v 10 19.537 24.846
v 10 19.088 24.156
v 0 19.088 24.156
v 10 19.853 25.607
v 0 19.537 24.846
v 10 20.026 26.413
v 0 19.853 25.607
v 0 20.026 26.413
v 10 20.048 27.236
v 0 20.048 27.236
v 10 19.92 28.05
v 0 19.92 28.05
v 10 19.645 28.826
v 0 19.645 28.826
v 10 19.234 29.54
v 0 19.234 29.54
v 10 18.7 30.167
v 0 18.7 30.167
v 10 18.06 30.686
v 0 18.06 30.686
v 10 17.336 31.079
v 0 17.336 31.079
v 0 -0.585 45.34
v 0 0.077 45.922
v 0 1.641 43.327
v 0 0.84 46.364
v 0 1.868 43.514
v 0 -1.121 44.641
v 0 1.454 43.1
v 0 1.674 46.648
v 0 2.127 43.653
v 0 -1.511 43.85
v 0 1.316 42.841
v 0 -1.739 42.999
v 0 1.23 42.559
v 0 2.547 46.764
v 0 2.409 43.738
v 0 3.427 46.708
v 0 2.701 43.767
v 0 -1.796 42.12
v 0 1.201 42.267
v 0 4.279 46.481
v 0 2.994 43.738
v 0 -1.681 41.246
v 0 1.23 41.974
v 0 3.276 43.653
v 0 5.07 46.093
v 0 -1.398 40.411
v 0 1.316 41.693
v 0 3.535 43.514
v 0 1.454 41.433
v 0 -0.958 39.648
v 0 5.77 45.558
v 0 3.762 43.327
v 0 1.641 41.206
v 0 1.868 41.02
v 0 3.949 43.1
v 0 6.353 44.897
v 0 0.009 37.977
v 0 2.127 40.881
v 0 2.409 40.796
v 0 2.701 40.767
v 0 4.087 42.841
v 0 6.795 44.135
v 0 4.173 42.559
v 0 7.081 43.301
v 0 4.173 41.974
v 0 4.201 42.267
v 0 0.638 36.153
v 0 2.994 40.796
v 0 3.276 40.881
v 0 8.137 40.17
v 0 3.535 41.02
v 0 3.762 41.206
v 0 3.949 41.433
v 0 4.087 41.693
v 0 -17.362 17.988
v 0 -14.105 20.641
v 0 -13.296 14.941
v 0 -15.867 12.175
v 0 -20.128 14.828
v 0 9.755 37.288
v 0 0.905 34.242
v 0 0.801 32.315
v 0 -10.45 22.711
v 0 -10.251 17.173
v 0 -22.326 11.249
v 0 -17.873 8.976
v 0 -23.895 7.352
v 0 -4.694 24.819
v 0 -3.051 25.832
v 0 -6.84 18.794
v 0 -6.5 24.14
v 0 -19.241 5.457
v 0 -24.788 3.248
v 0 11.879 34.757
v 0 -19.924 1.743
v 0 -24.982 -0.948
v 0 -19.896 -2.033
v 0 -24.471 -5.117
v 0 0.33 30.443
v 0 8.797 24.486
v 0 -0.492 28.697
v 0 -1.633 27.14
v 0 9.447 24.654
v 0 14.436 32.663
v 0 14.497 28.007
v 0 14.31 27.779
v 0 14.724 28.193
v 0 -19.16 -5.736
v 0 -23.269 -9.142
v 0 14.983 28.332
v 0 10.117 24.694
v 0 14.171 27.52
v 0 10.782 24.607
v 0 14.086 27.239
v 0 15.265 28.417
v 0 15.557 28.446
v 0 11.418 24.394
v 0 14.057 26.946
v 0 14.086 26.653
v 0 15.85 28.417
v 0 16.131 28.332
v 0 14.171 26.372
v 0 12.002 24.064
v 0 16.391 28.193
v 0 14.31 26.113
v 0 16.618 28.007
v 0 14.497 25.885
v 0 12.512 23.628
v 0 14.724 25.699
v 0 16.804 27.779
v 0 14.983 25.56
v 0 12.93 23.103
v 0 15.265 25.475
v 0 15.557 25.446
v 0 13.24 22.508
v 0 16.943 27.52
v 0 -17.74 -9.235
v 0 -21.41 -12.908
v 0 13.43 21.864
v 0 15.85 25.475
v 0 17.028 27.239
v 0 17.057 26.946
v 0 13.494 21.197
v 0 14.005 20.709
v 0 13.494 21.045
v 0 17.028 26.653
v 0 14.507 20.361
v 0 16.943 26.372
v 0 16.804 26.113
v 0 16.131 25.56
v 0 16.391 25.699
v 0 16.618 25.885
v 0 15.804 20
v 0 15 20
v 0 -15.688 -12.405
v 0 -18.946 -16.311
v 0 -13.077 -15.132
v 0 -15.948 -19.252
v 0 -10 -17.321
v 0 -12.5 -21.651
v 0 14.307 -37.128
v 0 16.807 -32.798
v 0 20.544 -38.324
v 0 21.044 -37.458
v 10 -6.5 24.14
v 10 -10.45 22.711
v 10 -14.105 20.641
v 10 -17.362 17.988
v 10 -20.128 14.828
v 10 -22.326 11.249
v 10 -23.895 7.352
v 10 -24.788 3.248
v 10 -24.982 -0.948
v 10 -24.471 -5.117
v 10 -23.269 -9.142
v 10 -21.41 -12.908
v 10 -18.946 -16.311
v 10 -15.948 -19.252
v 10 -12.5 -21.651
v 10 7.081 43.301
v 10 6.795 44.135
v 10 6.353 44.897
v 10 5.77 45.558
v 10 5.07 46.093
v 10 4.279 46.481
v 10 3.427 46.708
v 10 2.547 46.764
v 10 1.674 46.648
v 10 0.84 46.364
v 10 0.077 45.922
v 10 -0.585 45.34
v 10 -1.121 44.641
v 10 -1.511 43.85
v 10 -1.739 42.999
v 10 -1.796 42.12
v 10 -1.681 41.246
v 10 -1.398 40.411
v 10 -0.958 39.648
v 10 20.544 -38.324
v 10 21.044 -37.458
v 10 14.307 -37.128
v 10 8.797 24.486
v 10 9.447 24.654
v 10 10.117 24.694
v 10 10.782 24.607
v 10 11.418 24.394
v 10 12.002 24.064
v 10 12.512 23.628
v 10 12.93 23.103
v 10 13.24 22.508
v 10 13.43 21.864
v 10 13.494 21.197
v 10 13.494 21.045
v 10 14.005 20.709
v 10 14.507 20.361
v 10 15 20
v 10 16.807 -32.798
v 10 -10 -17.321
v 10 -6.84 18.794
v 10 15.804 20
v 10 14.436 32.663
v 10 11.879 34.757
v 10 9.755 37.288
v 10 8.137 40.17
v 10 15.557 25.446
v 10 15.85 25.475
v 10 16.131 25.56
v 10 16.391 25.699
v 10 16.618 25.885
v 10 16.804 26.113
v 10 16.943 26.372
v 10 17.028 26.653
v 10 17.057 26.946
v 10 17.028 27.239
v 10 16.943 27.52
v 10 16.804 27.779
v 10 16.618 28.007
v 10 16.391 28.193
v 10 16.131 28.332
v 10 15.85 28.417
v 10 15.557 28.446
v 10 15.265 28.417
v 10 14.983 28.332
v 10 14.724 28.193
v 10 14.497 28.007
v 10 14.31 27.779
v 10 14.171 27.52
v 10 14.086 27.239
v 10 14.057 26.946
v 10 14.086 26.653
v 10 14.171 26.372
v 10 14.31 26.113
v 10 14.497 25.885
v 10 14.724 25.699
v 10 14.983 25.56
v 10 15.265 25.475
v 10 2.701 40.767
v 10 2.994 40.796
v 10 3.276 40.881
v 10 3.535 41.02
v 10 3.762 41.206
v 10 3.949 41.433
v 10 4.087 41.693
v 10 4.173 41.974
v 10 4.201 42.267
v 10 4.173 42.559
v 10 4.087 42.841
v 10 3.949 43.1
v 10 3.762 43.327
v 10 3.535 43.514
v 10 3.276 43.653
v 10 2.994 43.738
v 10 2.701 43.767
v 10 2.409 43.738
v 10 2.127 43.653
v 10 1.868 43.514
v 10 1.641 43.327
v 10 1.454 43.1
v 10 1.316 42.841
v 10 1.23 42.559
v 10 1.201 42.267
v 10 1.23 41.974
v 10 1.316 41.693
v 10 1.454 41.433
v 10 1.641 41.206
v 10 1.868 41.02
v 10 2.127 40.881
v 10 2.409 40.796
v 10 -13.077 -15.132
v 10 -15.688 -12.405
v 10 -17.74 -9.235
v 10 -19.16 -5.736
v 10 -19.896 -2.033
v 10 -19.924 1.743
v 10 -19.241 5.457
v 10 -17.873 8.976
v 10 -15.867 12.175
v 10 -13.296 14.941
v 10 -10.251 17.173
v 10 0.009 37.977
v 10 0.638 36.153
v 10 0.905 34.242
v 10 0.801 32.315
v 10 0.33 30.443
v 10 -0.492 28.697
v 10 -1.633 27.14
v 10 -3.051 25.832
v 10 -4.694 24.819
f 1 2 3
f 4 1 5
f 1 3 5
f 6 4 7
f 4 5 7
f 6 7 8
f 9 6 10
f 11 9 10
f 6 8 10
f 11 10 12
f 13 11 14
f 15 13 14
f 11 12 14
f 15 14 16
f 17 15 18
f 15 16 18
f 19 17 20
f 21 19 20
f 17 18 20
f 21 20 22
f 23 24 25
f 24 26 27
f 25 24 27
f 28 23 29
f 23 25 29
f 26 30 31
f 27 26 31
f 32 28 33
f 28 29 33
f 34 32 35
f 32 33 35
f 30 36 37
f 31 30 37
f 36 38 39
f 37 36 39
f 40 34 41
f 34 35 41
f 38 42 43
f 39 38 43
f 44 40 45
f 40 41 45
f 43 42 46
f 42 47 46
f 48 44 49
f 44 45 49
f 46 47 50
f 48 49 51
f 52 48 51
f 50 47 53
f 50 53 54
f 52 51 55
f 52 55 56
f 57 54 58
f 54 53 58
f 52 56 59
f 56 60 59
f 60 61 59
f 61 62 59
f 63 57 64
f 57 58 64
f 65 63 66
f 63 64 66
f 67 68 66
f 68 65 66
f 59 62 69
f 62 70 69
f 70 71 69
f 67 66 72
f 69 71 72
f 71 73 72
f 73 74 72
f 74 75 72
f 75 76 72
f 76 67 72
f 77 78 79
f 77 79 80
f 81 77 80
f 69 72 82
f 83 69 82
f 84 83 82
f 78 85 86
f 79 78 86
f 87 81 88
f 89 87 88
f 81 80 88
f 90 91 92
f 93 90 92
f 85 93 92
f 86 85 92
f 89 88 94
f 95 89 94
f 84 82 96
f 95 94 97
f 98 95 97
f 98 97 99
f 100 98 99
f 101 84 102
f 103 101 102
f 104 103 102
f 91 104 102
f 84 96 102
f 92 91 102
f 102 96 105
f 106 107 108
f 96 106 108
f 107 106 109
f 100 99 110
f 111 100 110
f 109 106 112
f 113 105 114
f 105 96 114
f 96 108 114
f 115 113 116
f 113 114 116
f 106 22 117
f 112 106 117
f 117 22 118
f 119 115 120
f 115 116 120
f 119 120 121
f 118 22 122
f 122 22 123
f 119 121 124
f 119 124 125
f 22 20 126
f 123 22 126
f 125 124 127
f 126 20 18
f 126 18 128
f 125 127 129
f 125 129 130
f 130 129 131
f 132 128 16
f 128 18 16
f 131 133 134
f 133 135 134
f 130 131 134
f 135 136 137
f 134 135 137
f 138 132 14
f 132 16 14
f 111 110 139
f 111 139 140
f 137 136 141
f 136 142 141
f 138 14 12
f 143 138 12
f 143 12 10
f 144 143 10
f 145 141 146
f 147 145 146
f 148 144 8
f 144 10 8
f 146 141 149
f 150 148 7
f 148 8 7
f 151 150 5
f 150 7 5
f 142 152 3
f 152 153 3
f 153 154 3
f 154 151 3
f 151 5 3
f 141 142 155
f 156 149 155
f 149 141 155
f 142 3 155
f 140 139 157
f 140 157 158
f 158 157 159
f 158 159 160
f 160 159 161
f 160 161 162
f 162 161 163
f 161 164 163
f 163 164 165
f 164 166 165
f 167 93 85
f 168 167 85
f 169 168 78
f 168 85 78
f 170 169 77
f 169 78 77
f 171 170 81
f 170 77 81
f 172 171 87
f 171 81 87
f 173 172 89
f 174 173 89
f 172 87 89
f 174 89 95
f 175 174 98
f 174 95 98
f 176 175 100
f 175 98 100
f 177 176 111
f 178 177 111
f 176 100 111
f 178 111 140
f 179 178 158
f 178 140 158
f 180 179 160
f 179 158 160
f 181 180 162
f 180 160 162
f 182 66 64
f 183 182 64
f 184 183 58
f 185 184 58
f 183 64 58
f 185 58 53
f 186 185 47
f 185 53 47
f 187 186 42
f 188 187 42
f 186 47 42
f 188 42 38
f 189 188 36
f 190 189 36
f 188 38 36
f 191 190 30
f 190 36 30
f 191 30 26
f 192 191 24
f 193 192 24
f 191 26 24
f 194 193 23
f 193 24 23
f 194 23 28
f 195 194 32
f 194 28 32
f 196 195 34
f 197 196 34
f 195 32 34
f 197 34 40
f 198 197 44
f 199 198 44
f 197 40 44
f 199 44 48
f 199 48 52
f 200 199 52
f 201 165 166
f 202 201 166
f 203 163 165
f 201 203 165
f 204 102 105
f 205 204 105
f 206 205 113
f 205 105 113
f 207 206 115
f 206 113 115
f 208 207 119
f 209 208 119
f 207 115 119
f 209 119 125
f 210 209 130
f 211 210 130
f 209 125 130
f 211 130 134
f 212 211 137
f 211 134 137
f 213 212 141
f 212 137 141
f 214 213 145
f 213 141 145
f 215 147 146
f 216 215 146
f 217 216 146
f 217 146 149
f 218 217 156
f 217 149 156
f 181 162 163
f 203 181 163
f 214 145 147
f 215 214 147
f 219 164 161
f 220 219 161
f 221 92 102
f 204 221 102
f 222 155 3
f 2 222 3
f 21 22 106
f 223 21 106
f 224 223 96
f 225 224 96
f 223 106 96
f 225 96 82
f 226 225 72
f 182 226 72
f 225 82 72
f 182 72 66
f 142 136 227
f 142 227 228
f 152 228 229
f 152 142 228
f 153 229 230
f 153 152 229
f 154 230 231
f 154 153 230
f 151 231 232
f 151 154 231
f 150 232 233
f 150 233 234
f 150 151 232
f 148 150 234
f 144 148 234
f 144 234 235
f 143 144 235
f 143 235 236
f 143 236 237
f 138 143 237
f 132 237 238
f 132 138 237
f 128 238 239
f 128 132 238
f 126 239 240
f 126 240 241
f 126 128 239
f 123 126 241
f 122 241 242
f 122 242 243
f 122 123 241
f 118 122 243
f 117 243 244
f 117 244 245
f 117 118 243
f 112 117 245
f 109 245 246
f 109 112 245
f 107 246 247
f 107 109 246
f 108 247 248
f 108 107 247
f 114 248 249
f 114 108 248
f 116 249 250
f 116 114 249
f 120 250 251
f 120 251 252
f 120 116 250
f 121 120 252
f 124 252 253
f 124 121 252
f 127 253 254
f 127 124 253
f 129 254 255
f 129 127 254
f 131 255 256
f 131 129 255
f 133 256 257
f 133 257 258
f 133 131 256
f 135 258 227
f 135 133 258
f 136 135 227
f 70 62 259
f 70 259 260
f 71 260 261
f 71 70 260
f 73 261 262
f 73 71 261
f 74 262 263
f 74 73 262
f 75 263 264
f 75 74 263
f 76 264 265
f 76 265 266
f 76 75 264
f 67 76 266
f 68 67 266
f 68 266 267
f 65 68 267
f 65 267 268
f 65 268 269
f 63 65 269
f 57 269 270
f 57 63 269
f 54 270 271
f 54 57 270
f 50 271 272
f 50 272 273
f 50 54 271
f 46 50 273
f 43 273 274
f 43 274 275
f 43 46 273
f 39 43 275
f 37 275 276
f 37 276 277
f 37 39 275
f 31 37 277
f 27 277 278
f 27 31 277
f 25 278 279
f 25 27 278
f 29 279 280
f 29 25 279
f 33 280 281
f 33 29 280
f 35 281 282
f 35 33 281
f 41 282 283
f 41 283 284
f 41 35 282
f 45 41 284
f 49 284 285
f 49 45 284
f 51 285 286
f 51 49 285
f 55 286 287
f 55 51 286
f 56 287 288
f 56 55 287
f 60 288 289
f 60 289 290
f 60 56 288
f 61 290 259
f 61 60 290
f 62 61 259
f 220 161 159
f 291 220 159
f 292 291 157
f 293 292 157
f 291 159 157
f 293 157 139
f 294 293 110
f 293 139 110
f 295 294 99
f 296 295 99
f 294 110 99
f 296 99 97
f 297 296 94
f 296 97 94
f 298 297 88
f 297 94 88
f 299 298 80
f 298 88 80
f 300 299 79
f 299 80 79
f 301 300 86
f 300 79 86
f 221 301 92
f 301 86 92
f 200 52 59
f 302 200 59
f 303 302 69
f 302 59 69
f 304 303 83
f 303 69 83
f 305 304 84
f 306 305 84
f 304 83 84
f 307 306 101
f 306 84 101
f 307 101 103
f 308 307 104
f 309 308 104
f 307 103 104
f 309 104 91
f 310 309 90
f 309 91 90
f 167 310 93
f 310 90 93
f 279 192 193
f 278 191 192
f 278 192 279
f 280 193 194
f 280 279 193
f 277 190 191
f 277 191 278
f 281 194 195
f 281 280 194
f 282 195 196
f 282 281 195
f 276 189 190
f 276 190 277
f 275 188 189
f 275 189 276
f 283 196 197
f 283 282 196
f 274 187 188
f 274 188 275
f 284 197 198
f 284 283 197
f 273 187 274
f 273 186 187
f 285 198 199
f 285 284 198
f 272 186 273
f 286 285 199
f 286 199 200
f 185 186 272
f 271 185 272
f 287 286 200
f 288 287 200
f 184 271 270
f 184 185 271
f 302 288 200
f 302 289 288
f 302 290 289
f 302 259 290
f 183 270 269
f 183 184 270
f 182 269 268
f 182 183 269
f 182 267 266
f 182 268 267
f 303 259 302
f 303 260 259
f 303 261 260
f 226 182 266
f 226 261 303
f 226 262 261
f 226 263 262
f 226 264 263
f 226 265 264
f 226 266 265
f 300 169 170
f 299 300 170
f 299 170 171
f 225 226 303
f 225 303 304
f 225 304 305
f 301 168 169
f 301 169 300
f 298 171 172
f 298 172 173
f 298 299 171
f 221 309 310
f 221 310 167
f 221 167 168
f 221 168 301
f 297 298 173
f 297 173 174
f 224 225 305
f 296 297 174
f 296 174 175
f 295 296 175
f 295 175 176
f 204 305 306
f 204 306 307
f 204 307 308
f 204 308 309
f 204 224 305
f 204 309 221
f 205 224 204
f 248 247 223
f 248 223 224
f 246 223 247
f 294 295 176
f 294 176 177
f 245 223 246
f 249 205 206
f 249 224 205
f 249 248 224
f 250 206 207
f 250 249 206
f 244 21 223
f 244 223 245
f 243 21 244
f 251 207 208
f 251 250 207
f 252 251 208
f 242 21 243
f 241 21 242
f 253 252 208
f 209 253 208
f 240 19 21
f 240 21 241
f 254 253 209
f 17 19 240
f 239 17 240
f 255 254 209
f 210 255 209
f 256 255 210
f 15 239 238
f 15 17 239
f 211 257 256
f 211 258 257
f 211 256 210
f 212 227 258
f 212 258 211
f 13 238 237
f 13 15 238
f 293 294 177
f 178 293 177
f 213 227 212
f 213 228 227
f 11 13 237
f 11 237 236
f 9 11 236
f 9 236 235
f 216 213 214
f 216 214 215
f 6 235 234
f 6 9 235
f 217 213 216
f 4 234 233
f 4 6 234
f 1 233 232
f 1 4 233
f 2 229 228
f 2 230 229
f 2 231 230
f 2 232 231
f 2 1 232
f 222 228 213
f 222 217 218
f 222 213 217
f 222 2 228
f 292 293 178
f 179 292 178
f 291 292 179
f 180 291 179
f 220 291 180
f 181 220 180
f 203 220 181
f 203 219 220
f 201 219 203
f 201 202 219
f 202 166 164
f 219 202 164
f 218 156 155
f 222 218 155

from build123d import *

# Parameters (mm, degrees)
SKETCH_1_R      = 1.5
EXTRUDE_2_DEPTH = 10


with BuildPart() as part:
    # 草图1 → 凸台-拉伸2 (new body)
    with BuildSketch(Plane(origin=(0, 0, 0), x_dir=(0, 0, -1), z_dir=(1, 0, 0))):
        with BuildLine():
            ThreePointArc((17.320508076, -10), (-1.743114855, -19.923893962), (-18.793852416, -6.840402867))
            Line((-18.793852416, -6.840402867), (-24.485520572, 8.797326871))
            ThreePointArc((-24.485520572, 8.797326871), (-24.06362866, 12.001914989), (-21.196596456, 13.494397531))
            Line((-21.196596456, 13.494397531), (-21.045218822, 13.494397531))
            ThreePointArc((-21.045218822, 13.494397531), (-20.53641173, 14.256780606), (-20, 15))
            Line((-20, 15), (-20, 15.803944373))
            Line((-20, 15.803944373), (-24.155954344, 19.087967936))
            ThreePointArc((-24.155954344, 19.087967936), (-28.049684886, 19.919774087), (-31.079320854, 17.336298731))
            ThreePointArc((-31.079320854, 17.336298731), (-35.972771838, 10.757774611), (-43.301092247, 7.081014883))
            ThreePointArc((-43.301092247, 7.081014883), (-46.36357592, 0.839616609), (-39.647678535, -0.957765092))
            ThreePointArc((-39.647678535, -0.957765092), (-30.443187857, 0.329762523), (-24.14010081, -6.500425592))
            ThreePointArc((-24.14010081, -6.500425592), (-3.247781267, -24.788140649), (21.650635095, -12.5))
            Line((21.650635095, -12.5), (37.127801325, 14.307238269))
            Line((37.127801325, 14.307238269), (38.323661657, 20.544349721))
            Line((38.323661657, 20.544349721), (37.457636253, 21.044349721))
            Line((37.457636253, 21.044349721), (32.797674306, 16.807238269))
            Line((32.797674306, 16.807238269), (17.320508076, -10))
        make_face()
        with Locations((-26.945927107, 15.557238269)):
            Circle(SKETCH_1_R, mode=Mode.SUBTRACT)
        with Locations((-42.266815969, 2.701486075)):
            Circle(SKETCH_1_R, mode=Mode.SUBTRACT)
    extrude(amount=EXTRUDE_2_DEPTH)


solid = part.part
